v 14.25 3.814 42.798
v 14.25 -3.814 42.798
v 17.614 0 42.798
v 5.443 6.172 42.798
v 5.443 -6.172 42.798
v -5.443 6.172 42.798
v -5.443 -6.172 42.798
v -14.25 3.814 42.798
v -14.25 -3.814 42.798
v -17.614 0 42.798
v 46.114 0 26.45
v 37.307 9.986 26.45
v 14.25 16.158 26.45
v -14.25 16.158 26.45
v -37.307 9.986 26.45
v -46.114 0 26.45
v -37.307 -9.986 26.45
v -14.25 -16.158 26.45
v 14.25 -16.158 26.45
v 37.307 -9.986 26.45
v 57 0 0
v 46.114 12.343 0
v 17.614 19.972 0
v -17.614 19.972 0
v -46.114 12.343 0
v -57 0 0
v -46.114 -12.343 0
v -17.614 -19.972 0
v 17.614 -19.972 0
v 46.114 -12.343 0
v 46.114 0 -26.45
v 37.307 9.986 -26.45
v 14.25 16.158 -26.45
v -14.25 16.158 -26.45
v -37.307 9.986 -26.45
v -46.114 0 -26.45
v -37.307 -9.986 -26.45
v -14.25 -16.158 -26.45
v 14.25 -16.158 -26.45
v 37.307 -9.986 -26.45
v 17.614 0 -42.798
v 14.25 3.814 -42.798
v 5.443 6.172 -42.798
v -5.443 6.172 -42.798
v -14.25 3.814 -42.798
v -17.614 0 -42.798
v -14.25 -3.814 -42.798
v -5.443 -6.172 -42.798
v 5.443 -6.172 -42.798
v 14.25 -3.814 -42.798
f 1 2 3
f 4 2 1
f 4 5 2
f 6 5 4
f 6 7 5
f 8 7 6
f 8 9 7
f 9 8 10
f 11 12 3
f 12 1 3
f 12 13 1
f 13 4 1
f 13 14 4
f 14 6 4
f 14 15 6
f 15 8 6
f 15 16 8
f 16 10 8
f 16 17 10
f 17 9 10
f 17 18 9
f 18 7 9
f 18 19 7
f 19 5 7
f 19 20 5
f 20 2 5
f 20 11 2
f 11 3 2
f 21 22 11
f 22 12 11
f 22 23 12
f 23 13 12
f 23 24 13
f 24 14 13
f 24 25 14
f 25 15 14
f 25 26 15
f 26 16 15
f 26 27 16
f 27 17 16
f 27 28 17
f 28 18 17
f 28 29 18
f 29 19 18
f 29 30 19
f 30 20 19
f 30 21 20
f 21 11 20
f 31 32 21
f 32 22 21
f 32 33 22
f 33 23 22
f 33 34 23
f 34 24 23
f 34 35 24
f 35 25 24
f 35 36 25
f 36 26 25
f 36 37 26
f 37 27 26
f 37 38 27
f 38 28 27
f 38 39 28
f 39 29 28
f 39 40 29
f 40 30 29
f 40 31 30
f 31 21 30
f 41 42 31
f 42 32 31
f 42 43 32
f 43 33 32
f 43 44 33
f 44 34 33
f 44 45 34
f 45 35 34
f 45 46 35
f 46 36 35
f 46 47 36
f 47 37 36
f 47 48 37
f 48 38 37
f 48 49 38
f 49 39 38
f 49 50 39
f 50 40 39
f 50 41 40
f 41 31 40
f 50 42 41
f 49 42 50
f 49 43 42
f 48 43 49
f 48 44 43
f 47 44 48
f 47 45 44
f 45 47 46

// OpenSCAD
// Generated by SolidPython 1.0.1 on 2020-07-29 00:46:53


scale(v = [19, 7, 15]) {
	sphere(r = 3);
}
/***********************************************
*********      SolidPython code:      **********
************************************************
 
# import packages: SolidPython
from solid import *
from solid.utils import *
from itertools import chain, combinations, permutations


class Resize:

    def __init__(self, scad_file):
        self.scad_file = scad_file
        #self.scad_file = import_scad(scad_file)
        # cone/cylinder param:
        self.r1 = 0
        self.r2 = 0
        self.h = 0
        # rectangular prism param:
        self.w = 0
        self.l = 0
        # ellipse param:
        self.r = 0

    # import OpenScad code (file name corresponds to shape)


    # classify shape + parameters
    def assign(self, param1, param2, param3):
        if self.scad_file == 'cone.scad':
            self.r1 = param1
            self.r2 = param2
            self.h = param3
        elif self.scad_file == 'cylinder.scad':
            self.r1 = param1
            self.r2 = param2
            self.h = param3
        elif self.scad_file == 'rectangularPrism.scad':
            self.h = param1
            self.l = param2
            self.w = param3
        else:
            self.r = param1
            self.h = param2

    # resize parameters
    def iterate(self):
        x = range(3, 20, 2)
        i = 1
        if self.scad_file == 'cone.scad':
            tempList = list(permutations(x, 2))
            for temp in tempList:
                param1 = temp[0]
                param2 = temp[1]
                filepath = 'produced_scad_files/' + 'cone' + str(param1) + '_' + str(param2) + '_' + '.scad'
                scad_render_to_file(cylinder(h=param1, r1=param2, r2=0), filepath)

        elif self.scad_file == 'cylinder.scad':
            tempList = list(permutations(x, 3))
            for temp in tempList:
                param1 = temp[0]
                param2 = temp[1]
                filepath = 'produced_scad_files/' + 'cylinder' + str(param1) + '_' + str(param2) + '_' + '.scad'
                scad_render_to_file(cylinder(h=param1, r1=param2, r2=param2), filepath)

        elif self.scad_file == 'rectangularPrism.scad':
            tempList = list(permutations(x, 3))
            for temp in tempList:
                param1 = temp[0]
                param2 = temp[1]
                param3 = temp[2]
                filepath = 'produced_scad_files/' + 'rectangularPrism' + str(param1) + '_' + str(param2) + '_' + str(
                    param3) + '.scad'
                scad_render_to_file(cube(size=(param1, param2, param3)), filepath)

        elif self.scad_file == 'ellipse.scad':
            tempList = list(permutations(x, 4))
            for temp in tempList:
                param1 = temp[0]
                param2 = temp[1]
                param3 = temp[2]
                param4 = temp[3]
                filepath = 'produced_scad_files/' + 'ellipse' + str(param1) + '_' + str(param2) + '_' + str(param3) + '_' + str(param4) + '.scad'
                scad_render_to_file(scale([param1, param2, param3])(sphere(r=param4)), filepath)

    def render_to_scadfile(self):
        scad_render_to_file(scad, 'example.scad') 
 
************************************************/
